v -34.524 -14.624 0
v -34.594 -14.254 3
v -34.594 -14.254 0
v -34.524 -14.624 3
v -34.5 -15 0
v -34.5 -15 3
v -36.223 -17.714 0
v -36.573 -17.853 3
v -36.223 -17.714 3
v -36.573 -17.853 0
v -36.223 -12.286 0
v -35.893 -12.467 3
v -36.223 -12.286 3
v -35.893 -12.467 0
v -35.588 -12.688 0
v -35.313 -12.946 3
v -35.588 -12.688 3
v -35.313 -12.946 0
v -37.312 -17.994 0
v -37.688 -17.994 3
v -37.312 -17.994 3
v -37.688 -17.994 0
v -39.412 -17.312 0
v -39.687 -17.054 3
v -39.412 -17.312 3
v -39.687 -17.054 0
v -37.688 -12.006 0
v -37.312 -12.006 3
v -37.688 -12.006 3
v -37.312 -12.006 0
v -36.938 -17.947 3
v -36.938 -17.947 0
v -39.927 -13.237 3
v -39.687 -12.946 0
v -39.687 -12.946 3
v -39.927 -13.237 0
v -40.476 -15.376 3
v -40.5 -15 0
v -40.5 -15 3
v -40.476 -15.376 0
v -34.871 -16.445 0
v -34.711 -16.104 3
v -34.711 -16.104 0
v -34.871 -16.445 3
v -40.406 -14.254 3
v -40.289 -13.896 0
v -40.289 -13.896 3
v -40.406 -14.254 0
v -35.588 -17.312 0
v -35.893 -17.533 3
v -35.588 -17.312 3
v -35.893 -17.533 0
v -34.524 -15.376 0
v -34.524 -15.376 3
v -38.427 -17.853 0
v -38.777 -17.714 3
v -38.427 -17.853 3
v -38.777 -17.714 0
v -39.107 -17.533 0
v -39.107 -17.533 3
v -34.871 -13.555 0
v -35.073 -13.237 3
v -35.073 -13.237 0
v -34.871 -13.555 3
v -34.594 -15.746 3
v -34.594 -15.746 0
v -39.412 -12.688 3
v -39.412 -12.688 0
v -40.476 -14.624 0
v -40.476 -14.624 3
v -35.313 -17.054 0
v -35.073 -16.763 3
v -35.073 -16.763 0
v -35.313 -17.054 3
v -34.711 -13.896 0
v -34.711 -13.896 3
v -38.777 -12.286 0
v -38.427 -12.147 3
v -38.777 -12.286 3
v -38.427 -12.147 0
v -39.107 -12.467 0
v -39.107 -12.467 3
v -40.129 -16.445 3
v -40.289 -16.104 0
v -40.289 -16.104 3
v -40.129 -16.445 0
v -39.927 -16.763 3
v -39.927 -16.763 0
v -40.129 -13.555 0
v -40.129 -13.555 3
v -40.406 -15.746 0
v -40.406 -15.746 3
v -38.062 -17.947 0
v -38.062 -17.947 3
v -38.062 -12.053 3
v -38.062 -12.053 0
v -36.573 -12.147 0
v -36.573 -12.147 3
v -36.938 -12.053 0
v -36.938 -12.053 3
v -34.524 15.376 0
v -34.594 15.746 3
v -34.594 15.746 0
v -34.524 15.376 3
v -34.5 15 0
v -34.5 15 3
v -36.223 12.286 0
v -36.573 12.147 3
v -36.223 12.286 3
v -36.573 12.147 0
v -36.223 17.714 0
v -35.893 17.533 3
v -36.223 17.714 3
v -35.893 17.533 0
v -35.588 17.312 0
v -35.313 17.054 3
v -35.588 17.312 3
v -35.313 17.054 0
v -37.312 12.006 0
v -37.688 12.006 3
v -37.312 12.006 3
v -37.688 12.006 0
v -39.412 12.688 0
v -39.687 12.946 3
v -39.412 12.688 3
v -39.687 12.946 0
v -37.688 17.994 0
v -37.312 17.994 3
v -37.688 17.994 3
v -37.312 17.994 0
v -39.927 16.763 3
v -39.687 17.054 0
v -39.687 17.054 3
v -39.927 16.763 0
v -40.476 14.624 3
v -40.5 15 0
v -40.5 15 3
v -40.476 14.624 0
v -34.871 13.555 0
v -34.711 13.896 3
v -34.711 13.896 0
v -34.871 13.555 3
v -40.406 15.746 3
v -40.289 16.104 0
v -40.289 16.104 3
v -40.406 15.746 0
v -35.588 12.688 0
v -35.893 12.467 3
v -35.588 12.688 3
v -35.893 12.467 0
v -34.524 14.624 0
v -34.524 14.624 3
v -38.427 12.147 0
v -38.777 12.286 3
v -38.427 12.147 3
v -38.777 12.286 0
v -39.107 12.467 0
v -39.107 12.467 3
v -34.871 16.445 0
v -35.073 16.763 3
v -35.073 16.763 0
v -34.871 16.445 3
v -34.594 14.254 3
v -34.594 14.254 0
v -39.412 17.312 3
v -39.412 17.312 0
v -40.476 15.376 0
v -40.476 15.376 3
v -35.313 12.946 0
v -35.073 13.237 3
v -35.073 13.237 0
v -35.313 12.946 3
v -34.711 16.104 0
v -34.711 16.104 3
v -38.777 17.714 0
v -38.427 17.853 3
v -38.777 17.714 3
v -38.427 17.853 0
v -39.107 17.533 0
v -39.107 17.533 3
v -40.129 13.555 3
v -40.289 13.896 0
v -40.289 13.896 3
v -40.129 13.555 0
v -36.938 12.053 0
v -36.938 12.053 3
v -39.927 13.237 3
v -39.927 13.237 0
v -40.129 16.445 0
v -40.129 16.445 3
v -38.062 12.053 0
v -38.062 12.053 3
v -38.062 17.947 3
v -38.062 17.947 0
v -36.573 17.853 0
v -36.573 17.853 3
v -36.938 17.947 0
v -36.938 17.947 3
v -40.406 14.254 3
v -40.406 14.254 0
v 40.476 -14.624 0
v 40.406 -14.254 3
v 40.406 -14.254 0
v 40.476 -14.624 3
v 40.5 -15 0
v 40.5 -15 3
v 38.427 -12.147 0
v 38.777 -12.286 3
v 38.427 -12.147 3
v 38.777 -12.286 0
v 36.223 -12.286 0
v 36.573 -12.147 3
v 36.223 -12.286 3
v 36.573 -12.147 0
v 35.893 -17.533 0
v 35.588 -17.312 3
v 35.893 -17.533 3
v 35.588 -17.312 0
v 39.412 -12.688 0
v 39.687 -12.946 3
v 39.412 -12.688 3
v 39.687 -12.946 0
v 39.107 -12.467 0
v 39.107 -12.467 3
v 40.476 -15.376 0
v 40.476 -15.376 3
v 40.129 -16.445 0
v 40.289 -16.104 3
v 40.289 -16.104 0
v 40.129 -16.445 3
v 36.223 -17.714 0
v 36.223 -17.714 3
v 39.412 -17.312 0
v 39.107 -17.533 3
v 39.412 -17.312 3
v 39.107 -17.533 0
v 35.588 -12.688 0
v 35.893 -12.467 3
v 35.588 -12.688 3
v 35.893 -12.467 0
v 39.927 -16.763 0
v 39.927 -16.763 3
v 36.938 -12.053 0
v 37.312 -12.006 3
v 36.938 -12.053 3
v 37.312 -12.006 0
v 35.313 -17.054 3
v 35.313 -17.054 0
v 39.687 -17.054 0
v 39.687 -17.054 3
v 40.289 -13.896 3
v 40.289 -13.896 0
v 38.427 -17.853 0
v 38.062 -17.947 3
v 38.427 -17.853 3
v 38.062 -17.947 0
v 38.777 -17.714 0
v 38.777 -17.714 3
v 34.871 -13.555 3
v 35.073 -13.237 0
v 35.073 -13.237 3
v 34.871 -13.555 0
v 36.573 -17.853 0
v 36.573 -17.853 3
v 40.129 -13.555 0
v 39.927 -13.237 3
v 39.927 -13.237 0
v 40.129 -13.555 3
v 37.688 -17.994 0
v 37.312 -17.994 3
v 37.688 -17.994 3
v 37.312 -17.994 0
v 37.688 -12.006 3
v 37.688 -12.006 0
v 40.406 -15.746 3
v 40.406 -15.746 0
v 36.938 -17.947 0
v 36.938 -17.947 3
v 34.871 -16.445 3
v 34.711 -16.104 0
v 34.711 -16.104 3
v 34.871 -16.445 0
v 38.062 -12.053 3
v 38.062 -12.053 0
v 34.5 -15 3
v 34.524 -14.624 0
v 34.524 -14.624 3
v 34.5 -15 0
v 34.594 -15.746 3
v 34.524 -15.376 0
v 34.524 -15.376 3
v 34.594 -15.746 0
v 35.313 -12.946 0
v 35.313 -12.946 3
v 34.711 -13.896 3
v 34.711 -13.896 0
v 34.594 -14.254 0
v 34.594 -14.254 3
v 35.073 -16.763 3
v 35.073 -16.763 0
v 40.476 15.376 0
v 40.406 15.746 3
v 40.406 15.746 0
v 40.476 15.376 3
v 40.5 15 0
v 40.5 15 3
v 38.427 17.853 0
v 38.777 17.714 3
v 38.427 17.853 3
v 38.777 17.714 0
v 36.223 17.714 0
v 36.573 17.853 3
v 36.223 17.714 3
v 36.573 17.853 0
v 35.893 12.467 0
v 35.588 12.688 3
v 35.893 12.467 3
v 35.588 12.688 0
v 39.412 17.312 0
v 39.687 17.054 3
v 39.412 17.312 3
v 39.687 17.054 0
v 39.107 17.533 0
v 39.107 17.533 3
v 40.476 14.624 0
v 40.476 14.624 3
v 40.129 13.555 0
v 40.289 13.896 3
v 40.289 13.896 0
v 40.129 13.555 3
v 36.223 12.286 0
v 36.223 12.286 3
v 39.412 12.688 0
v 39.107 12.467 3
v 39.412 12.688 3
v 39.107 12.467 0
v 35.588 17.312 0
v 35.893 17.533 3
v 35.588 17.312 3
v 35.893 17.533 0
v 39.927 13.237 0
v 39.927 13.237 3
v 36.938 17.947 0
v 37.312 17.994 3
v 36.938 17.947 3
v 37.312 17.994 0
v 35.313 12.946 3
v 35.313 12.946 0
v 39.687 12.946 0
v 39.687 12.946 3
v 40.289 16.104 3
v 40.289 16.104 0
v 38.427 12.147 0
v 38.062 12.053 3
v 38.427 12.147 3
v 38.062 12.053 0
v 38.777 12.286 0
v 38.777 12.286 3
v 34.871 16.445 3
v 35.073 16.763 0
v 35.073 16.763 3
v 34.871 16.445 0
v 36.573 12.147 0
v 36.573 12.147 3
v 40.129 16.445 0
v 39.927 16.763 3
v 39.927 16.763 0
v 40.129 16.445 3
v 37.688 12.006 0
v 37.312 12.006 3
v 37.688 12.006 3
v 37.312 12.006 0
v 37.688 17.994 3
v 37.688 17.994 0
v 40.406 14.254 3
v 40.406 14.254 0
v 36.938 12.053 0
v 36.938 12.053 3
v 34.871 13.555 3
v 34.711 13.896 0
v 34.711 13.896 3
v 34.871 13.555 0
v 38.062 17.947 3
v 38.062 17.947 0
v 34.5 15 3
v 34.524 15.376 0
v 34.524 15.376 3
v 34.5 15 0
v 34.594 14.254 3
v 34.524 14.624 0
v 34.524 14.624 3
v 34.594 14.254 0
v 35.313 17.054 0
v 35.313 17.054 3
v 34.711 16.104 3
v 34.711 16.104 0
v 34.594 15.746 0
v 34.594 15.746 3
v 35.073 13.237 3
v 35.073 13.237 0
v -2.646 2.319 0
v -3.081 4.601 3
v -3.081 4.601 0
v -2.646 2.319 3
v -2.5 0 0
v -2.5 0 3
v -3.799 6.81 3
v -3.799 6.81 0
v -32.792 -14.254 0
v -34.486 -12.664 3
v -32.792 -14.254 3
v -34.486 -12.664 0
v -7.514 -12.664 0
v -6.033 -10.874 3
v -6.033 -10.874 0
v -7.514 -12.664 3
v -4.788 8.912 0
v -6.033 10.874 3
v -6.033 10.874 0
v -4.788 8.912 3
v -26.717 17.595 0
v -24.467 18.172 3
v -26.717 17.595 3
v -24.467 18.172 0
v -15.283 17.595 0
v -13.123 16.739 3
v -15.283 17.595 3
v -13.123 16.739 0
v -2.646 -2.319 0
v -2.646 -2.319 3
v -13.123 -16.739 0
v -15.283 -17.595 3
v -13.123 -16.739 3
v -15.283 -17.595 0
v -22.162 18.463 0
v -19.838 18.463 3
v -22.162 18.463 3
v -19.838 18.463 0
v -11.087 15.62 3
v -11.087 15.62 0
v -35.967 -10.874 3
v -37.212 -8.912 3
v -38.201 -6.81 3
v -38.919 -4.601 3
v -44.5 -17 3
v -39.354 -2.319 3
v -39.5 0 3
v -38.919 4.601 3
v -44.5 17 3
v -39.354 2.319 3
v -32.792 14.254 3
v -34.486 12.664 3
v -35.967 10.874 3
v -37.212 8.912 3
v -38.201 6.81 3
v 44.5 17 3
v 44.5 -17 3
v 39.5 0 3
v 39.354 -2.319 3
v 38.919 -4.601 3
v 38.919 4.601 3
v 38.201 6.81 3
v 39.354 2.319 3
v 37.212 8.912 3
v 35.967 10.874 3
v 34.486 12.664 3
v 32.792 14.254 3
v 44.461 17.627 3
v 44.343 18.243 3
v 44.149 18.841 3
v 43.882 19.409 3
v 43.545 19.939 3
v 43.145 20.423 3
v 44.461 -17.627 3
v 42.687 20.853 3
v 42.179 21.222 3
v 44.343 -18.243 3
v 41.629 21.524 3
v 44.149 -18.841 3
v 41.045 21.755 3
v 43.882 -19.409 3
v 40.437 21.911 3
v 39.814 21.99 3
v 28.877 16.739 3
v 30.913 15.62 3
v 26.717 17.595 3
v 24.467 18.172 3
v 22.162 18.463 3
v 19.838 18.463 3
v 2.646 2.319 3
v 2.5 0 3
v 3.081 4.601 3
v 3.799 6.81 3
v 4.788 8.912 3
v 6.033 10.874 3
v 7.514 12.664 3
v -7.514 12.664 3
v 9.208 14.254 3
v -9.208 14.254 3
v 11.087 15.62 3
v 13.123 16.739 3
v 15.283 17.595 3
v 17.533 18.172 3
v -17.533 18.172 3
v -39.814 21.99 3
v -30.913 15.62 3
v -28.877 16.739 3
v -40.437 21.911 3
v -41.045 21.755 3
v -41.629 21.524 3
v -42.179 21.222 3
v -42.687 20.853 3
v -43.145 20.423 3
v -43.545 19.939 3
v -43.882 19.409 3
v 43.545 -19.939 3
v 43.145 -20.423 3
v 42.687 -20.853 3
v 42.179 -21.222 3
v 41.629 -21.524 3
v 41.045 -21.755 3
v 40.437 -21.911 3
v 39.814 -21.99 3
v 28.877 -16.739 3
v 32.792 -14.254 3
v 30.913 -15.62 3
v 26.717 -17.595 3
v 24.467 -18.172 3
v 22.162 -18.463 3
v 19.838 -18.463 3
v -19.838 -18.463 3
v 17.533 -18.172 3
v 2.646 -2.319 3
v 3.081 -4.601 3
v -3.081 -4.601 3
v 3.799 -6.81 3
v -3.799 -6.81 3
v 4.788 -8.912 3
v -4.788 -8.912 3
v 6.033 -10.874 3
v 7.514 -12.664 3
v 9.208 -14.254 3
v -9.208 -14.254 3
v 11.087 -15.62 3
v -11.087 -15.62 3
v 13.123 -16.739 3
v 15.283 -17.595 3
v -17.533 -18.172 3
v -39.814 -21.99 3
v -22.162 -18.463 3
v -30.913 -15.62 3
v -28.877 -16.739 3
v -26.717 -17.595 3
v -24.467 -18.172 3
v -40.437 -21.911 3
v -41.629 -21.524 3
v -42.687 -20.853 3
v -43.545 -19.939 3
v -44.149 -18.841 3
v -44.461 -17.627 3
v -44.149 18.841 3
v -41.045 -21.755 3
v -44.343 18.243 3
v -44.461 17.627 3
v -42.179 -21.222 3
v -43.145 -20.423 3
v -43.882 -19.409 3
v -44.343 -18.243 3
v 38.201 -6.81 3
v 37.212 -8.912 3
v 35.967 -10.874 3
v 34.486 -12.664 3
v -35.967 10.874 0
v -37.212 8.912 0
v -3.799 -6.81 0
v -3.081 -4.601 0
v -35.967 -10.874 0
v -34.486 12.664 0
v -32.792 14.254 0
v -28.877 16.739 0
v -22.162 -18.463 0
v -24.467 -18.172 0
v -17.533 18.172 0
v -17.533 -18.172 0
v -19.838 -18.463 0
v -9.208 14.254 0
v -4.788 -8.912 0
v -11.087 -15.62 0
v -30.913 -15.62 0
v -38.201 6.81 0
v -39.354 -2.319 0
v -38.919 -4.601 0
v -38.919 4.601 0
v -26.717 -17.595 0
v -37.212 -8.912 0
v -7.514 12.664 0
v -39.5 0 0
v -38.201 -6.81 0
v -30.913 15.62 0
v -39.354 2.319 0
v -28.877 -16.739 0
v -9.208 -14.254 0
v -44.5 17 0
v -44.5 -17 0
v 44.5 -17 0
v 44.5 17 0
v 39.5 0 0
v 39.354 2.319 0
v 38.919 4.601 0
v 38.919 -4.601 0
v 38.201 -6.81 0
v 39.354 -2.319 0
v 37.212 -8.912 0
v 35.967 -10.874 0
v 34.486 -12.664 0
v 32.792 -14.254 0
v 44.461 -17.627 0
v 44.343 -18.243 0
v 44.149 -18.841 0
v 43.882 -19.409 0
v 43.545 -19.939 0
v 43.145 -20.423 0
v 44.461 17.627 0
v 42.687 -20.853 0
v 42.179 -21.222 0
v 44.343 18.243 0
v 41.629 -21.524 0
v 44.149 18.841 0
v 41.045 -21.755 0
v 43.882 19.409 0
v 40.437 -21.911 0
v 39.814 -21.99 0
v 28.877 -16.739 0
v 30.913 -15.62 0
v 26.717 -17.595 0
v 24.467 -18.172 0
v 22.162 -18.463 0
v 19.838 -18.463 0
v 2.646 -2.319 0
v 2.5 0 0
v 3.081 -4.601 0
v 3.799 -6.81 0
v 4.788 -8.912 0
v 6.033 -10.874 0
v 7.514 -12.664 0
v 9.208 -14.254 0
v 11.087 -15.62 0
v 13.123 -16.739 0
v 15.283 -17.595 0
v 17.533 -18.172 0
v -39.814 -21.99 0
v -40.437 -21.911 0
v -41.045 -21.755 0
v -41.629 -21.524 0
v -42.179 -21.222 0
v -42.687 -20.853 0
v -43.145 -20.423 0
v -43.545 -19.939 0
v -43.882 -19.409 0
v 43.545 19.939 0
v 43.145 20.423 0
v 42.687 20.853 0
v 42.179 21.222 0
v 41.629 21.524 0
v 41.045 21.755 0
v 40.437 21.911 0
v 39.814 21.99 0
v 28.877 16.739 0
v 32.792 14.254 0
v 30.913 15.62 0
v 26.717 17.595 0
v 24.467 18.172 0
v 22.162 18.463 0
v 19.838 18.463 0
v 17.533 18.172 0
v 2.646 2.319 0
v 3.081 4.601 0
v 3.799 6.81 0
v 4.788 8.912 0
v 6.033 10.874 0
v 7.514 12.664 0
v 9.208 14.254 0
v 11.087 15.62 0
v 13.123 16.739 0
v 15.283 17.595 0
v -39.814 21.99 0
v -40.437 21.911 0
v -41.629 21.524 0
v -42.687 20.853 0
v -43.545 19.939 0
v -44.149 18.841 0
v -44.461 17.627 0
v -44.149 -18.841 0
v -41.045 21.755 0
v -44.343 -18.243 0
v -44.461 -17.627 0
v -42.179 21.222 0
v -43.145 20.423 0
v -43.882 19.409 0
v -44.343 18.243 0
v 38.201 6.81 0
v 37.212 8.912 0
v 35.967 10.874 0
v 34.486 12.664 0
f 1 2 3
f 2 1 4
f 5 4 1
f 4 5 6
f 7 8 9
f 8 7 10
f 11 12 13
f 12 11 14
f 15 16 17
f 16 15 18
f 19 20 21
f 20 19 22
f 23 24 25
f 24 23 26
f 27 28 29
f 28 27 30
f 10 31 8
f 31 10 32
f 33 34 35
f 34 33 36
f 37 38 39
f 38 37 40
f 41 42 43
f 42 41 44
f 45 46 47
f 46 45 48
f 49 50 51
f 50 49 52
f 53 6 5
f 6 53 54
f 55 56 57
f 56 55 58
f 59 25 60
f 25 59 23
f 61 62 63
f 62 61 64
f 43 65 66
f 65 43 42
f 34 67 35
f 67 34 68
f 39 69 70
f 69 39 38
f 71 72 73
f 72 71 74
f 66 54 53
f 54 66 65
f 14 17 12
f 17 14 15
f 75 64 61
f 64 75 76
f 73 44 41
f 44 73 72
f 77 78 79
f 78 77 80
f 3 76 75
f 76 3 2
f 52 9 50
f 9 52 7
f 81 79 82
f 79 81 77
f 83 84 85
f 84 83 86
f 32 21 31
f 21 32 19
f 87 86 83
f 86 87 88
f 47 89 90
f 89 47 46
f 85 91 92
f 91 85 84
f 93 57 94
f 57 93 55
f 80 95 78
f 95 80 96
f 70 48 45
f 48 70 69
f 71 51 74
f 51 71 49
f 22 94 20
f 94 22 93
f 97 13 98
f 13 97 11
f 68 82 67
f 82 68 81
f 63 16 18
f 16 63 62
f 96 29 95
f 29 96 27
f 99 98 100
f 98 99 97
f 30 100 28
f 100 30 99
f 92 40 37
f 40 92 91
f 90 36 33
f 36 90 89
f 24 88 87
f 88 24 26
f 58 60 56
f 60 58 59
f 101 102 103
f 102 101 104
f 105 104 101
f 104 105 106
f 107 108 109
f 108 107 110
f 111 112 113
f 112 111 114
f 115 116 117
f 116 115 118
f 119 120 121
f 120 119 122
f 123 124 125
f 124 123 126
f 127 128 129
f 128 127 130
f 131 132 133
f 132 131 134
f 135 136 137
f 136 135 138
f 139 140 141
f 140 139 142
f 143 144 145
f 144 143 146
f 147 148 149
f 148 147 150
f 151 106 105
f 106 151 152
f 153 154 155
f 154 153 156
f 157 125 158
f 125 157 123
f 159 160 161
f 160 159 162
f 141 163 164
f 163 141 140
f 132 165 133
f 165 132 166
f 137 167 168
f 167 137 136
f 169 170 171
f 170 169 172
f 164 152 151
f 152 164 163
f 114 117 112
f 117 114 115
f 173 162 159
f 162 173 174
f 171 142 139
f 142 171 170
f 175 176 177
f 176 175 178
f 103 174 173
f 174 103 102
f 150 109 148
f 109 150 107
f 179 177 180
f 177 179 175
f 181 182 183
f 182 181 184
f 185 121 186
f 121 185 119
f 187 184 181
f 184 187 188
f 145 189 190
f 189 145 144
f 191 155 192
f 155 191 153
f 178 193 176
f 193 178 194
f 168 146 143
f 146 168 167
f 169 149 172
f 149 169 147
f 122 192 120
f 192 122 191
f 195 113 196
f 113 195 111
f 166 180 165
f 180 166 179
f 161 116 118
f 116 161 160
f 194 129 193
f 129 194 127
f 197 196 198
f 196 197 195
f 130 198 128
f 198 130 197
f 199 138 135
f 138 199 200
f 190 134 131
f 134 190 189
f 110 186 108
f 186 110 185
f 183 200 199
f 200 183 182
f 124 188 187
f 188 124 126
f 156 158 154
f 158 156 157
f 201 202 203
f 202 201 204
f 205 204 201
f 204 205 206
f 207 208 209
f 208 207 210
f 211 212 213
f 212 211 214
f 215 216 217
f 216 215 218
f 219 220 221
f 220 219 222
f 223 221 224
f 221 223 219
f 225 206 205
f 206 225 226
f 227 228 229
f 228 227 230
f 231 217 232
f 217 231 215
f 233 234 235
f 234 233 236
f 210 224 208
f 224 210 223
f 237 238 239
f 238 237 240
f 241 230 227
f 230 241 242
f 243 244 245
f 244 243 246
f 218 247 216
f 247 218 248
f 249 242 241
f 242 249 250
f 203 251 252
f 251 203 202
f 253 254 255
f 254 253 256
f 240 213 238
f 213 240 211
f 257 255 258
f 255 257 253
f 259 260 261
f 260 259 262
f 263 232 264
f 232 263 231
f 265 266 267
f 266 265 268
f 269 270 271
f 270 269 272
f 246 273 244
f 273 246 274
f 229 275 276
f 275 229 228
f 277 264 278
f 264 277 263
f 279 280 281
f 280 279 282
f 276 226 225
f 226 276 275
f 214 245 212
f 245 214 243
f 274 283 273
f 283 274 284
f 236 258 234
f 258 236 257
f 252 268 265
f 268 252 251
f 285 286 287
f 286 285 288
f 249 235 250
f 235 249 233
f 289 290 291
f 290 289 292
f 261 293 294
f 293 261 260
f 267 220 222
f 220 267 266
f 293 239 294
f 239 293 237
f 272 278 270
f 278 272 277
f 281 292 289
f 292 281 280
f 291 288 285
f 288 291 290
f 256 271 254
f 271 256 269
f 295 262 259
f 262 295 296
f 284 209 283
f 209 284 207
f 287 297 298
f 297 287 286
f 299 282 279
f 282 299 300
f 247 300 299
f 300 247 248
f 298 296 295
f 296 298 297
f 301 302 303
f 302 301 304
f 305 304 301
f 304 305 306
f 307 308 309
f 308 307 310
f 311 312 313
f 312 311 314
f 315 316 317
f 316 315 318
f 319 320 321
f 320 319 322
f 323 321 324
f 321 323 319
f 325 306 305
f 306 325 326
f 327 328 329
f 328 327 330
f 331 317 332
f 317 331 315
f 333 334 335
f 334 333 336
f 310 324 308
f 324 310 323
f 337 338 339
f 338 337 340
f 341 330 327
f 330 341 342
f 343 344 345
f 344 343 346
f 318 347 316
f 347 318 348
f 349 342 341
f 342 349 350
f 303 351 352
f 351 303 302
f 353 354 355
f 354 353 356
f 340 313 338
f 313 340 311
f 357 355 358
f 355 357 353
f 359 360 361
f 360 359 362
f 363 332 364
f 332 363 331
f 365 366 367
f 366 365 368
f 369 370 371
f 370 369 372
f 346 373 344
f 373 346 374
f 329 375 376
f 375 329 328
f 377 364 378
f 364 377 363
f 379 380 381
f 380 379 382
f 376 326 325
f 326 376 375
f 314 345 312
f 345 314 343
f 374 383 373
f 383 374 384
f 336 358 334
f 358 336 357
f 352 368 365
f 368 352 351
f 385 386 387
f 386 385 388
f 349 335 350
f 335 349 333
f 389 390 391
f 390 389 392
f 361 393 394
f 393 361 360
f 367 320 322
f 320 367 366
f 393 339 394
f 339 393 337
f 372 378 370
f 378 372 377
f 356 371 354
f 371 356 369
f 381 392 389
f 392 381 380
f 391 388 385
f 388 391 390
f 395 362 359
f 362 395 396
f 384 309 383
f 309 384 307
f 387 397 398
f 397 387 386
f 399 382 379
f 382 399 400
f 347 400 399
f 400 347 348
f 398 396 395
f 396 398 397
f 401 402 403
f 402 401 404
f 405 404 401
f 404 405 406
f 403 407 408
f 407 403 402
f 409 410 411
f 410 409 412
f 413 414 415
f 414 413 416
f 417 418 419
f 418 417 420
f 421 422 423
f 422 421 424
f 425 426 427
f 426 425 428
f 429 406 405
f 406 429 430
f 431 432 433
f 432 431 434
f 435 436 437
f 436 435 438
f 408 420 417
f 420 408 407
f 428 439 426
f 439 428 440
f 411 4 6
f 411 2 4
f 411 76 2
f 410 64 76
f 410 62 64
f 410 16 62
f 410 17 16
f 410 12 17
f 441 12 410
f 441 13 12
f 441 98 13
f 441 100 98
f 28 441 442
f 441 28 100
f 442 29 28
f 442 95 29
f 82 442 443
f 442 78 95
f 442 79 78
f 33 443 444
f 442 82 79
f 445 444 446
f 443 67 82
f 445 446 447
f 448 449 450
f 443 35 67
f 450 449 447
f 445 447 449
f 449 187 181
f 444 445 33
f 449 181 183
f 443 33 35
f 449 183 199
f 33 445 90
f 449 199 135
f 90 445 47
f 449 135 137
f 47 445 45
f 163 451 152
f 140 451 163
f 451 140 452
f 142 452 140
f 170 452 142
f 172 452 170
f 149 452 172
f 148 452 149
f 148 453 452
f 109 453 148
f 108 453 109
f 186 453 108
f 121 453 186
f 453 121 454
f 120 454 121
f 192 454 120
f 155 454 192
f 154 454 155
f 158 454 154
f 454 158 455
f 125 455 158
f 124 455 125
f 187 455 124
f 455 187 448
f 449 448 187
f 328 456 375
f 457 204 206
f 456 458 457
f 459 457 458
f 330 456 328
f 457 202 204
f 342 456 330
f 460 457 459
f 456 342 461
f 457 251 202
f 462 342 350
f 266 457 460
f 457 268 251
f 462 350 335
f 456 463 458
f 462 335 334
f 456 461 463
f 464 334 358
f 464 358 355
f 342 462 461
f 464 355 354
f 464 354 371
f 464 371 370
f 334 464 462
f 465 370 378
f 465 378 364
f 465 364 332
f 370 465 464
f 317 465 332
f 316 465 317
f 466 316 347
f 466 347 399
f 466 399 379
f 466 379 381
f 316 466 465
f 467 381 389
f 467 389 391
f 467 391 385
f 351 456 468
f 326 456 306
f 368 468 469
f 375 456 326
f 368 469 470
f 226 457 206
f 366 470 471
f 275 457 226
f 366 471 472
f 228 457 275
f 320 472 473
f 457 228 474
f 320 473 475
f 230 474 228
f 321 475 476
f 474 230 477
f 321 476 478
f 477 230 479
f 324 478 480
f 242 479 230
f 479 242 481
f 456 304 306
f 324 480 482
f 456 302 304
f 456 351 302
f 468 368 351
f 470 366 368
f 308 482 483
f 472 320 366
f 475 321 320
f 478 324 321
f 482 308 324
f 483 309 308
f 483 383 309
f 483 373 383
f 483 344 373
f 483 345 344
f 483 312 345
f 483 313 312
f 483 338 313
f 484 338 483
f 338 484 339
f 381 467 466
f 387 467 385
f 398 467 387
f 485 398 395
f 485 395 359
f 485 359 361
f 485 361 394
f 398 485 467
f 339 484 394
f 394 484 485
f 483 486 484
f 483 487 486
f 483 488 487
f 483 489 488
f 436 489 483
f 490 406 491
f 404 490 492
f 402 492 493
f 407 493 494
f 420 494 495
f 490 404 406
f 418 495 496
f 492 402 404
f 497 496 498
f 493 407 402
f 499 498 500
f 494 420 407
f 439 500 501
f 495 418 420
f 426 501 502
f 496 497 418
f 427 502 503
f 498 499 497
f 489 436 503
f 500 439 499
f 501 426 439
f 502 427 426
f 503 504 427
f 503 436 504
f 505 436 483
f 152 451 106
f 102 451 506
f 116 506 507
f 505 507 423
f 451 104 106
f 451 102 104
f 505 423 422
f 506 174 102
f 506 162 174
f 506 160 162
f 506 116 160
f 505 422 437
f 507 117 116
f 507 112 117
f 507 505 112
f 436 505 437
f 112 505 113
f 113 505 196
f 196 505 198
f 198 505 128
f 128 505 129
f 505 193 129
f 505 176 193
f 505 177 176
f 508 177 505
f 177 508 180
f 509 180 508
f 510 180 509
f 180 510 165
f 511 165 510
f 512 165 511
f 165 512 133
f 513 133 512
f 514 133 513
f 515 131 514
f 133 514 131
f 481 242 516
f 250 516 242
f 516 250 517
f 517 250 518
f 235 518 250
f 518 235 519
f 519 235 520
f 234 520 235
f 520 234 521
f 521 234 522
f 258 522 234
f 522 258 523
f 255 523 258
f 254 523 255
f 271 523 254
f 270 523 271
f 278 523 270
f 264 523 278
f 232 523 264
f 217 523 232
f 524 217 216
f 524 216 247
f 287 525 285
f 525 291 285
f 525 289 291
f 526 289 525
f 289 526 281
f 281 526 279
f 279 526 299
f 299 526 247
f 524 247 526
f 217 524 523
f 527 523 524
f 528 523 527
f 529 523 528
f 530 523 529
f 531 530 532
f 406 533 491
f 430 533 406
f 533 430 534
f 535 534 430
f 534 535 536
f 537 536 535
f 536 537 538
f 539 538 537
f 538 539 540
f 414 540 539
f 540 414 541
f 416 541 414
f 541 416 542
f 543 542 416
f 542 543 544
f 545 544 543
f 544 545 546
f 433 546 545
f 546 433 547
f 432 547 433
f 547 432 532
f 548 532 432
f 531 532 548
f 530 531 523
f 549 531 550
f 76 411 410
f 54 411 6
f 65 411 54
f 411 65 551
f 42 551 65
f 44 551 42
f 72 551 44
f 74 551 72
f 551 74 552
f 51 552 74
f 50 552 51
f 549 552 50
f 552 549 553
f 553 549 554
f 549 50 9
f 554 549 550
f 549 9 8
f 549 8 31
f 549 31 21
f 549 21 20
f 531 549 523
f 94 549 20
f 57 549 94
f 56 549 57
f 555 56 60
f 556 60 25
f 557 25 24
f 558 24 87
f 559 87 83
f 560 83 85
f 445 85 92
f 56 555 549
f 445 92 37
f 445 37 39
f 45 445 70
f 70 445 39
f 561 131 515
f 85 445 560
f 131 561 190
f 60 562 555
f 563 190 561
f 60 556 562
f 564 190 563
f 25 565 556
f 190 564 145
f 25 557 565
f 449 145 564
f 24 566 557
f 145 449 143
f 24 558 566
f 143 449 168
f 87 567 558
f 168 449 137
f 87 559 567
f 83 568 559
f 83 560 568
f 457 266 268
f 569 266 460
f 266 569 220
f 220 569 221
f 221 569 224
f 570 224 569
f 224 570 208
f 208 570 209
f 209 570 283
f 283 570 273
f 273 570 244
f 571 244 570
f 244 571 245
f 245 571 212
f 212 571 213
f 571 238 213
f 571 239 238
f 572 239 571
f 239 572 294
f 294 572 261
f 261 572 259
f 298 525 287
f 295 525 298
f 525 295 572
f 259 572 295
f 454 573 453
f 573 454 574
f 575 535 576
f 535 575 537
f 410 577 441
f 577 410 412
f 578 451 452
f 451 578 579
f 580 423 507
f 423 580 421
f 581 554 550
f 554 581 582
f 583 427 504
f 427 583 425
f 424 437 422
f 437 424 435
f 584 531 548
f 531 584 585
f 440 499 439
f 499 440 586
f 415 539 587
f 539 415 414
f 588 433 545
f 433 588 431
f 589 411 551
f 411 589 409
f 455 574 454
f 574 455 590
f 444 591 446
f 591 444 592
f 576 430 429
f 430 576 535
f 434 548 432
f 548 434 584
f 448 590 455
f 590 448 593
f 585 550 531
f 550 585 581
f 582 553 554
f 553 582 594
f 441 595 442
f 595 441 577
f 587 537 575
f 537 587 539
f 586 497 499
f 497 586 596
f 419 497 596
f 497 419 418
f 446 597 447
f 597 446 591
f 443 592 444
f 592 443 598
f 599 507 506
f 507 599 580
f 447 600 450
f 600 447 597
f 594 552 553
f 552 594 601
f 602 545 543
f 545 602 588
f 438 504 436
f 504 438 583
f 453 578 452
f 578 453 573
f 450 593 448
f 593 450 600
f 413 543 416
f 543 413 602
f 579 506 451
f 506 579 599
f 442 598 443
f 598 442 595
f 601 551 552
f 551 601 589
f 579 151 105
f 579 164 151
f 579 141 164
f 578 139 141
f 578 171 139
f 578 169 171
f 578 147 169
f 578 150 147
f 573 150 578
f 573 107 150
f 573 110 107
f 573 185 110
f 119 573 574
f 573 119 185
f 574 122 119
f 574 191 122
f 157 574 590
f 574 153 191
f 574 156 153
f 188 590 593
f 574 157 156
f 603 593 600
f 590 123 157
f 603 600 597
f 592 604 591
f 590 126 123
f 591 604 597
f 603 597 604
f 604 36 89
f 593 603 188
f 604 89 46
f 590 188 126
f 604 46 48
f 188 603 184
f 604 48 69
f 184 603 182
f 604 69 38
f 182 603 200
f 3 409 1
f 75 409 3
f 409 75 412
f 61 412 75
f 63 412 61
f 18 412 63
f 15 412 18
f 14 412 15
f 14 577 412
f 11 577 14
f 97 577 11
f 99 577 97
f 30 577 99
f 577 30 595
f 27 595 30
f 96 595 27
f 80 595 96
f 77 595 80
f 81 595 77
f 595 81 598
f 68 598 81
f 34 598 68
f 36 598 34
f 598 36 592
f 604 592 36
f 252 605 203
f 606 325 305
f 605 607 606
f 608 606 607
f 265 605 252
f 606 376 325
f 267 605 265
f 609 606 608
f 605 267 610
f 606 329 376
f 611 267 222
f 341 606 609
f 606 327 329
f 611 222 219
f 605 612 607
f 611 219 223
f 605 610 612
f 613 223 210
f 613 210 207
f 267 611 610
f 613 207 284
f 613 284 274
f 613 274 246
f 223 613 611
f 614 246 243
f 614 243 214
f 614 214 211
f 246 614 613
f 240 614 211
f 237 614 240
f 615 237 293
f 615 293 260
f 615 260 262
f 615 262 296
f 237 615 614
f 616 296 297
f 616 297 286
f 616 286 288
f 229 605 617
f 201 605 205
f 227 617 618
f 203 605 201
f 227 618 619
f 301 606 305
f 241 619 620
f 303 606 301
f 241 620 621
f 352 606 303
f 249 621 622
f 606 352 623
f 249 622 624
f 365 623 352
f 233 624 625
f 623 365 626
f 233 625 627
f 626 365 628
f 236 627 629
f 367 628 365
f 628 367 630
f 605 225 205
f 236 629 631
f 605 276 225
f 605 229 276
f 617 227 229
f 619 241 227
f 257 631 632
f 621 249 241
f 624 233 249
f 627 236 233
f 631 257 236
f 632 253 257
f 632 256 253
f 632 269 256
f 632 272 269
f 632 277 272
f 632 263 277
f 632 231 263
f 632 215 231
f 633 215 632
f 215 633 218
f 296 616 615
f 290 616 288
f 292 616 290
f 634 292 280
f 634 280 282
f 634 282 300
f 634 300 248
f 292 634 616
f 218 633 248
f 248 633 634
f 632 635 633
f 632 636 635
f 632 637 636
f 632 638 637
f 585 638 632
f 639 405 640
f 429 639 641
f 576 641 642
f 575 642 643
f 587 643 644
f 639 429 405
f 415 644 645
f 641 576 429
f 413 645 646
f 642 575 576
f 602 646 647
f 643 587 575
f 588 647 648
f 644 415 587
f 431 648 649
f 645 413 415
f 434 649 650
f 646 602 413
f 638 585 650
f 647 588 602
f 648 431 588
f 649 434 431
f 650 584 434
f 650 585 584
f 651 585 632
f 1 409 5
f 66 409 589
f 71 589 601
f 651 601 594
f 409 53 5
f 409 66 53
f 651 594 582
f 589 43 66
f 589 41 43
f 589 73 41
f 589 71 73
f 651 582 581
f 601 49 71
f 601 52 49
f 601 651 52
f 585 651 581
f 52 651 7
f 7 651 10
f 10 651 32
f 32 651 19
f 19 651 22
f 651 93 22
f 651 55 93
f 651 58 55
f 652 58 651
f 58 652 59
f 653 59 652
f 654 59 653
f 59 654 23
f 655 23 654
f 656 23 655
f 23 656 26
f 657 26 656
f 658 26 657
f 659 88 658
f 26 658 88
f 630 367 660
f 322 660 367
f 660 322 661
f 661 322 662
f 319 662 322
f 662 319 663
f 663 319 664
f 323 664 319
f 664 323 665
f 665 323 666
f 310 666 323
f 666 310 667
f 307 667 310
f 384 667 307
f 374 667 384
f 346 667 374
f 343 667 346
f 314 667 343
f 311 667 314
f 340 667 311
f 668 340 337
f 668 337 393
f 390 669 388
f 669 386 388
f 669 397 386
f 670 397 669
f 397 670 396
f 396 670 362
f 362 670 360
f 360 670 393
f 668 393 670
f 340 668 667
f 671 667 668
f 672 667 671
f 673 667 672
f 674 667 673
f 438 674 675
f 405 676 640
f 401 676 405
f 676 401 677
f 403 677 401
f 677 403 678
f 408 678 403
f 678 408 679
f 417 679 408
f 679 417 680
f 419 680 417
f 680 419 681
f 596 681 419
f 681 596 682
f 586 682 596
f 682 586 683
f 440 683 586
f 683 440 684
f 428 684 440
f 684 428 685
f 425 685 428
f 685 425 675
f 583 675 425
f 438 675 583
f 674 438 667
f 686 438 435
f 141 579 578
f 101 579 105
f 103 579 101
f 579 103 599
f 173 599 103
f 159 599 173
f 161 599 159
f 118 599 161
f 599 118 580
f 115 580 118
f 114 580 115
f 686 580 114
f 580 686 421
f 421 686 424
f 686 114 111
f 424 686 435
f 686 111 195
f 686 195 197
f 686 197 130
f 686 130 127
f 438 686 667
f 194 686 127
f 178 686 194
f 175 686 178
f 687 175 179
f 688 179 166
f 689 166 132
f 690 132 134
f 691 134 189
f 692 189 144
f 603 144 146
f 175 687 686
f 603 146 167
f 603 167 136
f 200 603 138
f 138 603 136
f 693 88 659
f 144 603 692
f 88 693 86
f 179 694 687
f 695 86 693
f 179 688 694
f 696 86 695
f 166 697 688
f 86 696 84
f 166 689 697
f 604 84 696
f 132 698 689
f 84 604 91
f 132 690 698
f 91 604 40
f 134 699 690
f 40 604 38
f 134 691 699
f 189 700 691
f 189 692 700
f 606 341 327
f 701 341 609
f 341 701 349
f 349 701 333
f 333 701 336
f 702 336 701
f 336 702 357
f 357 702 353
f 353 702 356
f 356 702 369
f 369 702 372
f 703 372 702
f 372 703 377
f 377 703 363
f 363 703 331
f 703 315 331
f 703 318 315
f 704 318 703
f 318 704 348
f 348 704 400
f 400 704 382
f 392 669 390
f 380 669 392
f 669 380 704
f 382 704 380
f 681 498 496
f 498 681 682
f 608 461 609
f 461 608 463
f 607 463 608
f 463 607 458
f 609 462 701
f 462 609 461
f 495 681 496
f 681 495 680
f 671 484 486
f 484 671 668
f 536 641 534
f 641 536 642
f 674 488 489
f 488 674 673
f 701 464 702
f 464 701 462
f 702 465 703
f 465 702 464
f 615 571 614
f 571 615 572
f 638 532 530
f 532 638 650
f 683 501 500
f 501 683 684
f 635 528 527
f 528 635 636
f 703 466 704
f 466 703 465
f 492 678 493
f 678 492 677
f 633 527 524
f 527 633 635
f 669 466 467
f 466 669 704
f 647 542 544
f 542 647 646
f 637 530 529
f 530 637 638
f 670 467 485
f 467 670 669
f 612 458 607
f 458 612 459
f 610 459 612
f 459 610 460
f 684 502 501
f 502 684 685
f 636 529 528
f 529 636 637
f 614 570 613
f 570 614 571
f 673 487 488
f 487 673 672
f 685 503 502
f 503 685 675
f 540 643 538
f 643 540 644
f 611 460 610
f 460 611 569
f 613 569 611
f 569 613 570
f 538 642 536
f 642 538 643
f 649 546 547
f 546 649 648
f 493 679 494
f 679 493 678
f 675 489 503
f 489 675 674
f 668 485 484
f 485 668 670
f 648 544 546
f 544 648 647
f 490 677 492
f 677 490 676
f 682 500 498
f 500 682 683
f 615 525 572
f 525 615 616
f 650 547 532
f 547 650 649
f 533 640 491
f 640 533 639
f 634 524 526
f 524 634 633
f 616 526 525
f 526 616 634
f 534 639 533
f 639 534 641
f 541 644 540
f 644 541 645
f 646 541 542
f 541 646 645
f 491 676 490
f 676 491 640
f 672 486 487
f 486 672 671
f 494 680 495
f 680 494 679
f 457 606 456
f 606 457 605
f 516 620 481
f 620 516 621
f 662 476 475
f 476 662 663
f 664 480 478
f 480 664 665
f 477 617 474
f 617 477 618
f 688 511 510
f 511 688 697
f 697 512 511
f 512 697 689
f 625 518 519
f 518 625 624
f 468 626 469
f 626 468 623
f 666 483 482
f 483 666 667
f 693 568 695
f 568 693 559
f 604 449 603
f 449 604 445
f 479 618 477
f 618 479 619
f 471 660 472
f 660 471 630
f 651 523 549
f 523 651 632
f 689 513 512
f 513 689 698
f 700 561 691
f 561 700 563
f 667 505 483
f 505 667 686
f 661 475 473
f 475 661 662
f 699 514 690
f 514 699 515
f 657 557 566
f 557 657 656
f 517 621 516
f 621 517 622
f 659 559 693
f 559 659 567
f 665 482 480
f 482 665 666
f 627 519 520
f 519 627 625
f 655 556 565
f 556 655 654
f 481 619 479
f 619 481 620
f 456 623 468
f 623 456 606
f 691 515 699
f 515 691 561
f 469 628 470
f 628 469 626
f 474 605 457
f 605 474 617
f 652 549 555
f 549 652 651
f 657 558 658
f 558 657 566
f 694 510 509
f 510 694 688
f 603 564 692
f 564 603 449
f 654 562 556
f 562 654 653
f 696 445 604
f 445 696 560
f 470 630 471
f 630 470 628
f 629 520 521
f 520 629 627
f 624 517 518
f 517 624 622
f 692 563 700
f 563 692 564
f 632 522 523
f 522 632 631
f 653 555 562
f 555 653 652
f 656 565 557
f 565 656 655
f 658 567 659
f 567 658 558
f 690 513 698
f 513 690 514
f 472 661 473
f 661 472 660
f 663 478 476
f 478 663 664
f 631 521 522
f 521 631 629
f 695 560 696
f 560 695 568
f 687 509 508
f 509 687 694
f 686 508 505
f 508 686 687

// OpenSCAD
$fn = 50;


difference() {
	union() {
		hull() {
			translate(v = [-39.5000000000, 17.0000000000, 0]) {
				cylinder(h = 3, r = 5);
			}
			translate(v = [39.5000000000, 17.0000000000, 0]) {
				cylinder(h = 3, r = 5);
			}
			translate(v = [-39.5000000000, -17.0000000000, 0]) {
				cylinder(h = 3, r = 5);
			}
			translate(v = [39.5000000000, -17.0000000000, 0]) {
				cylinder(h = 3, r = 5);
			}
		}
	}
	union() {
		#translate(v = [-37.5000000000, -15.0000000000, -100.0000000000]) {
			cylinder(h = 200, r = 3.0000000000);
		}
		#translate(v = [-37.5000000000, 15.0000000000, -100.0000000000]) {
			cylinder(h = 200, r = 3.0000000000);
		}
		#translate(v = [37.5000000000, -15.0000000000, -100.0000000000]) {
			cylinder(h = 200, r = 3.0000000000);
		}
		#translate(v = [37.5000000000, 15.0000000000, -100.0000000000]) {
			cylinder(h = 200, r = 3.0000000000);
		}
		#translate(v = [-21.0000000000, 0, 0]) {
			cylinder(h = 3, r = 18.5000000000);
		}
		#translate(v = [21.0000000000, 0, 0]) {
			cylinder(h = 3, r = 18.5000000000);
		}
	}
}
